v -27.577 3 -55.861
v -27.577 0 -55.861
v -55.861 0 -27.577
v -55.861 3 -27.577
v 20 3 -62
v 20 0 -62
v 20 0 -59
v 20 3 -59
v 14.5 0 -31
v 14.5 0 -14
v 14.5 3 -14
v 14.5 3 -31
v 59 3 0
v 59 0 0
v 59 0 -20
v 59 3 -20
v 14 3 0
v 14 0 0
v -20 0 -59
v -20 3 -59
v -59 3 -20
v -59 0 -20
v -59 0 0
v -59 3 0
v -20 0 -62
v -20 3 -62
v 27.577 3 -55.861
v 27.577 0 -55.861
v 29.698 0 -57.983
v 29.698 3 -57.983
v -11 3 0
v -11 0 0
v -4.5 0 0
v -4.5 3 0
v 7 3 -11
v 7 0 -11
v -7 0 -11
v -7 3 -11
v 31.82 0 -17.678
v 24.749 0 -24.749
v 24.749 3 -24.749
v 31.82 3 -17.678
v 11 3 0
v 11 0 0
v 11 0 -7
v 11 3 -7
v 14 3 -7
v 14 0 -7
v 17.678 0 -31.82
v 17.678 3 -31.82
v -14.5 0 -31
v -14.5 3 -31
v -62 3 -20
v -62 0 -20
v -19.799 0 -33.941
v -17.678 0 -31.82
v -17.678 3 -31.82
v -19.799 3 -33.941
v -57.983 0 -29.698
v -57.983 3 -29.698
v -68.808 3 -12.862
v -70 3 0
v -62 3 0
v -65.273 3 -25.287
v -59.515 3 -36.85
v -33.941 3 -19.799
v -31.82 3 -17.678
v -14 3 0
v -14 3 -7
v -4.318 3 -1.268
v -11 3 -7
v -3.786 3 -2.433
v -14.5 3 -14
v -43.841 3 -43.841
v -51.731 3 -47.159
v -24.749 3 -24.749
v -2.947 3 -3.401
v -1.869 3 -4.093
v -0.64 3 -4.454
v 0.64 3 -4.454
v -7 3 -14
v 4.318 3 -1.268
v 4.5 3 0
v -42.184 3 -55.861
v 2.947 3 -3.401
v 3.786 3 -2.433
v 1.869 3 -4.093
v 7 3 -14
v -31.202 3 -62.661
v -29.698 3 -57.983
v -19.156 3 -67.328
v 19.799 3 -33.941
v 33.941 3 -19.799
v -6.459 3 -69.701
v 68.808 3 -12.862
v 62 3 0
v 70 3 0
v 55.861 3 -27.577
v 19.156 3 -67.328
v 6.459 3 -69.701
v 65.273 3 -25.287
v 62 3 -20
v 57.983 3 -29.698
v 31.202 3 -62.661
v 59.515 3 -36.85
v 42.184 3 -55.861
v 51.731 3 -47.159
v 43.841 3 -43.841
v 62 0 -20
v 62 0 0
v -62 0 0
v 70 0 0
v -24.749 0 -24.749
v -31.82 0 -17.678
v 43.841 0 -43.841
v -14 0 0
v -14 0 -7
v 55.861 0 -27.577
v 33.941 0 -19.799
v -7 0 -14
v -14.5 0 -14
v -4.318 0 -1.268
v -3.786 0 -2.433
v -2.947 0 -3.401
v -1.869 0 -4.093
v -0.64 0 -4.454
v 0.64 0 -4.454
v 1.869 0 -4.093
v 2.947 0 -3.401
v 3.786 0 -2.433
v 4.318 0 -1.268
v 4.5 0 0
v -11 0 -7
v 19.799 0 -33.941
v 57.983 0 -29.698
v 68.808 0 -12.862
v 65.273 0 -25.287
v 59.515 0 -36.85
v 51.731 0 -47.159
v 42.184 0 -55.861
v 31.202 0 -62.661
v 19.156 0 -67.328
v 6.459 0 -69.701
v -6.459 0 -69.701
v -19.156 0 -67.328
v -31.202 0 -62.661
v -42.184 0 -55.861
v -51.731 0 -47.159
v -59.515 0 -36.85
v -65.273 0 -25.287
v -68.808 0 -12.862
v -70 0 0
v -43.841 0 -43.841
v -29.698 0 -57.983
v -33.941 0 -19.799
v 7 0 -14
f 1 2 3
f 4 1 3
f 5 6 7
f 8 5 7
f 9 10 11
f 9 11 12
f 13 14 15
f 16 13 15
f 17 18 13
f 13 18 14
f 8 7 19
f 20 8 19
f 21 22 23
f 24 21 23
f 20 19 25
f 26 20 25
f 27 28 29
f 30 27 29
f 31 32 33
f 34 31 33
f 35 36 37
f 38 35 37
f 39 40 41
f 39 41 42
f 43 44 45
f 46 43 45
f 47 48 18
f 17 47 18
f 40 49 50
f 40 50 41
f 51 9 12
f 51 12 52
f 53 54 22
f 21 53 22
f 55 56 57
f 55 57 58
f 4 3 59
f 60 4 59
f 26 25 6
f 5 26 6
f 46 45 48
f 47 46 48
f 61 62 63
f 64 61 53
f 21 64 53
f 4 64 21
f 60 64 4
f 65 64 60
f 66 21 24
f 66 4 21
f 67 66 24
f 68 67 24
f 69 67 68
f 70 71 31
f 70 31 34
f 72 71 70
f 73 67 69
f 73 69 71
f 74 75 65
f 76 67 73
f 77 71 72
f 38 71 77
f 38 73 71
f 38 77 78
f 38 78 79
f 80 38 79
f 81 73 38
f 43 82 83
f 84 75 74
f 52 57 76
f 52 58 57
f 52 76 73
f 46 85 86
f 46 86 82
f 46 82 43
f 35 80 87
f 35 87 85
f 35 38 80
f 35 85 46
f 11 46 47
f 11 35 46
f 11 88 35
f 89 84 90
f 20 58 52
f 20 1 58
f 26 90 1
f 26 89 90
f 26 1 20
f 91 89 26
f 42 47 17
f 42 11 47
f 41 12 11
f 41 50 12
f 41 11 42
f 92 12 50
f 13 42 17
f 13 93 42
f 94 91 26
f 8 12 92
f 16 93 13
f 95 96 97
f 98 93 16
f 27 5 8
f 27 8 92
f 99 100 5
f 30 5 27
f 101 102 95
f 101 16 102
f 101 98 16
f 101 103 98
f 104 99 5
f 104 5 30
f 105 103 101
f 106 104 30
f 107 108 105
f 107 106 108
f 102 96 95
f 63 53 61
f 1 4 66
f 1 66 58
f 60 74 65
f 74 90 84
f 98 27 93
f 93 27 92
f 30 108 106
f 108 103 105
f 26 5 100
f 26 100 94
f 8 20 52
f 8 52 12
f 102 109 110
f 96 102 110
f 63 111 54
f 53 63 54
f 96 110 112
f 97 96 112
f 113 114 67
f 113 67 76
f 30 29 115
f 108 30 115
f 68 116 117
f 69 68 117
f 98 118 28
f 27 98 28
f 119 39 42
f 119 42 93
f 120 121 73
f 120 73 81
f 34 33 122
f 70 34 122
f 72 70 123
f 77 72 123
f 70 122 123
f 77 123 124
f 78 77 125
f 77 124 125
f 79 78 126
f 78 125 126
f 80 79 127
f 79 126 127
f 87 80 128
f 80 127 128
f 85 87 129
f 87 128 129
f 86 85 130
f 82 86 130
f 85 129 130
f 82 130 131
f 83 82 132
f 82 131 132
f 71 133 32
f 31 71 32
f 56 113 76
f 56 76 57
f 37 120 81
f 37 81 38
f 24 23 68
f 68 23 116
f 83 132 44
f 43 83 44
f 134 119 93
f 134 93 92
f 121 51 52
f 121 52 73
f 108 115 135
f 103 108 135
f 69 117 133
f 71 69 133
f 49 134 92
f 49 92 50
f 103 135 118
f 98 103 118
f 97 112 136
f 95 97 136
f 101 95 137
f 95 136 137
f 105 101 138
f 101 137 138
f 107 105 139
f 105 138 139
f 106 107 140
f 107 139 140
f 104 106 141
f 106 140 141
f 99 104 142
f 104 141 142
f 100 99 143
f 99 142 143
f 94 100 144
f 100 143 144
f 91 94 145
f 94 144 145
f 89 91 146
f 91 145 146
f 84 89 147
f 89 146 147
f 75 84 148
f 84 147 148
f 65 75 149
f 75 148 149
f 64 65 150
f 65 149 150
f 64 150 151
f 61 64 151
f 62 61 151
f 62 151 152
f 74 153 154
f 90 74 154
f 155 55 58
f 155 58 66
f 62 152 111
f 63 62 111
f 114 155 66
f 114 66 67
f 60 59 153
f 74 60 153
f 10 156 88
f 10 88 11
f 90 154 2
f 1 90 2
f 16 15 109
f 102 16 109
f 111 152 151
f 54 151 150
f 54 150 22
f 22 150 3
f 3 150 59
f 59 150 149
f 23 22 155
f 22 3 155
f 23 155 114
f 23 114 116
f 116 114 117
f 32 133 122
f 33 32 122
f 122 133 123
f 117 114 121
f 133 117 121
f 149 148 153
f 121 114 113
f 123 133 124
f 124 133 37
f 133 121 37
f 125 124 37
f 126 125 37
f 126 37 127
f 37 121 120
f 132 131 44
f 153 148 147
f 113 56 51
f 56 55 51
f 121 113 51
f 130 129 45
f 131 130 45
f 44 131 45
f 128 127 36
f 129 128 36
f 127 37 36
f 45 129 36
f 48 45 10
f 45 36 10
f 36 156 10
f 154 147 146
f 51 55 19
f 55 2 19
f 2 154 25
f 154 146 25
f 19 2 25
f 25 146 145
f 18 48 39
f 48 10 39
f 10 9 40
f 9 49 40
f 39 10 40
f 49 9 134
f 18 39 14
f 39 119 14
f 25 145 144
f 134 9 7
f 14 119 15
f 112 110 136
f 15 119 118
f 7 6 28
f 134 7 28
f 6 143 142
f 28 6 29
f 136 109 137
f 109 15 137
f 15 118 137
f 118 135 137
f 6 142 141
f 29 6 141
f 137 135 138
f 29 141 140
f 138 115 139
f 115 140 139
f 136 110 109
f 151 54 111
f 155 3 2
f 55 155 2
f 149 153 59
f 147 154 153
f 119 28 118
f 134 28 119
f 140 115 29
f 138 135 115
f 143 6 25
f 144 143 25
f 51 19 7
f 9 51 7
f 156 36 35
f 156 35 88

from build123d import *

# Parameters (mm, degrees)
SALIENTE_EXTRUIR1_DEPTH = 3


with BuildPart() as part:
    # Croquis1 → Saliente-Extruir1 (new body)
    with BuildSketch(Plane(origin=(0, 0, 0), x_dir=(1, 0, 0), z_dir=(0, 1, 0))):
        with BuildLine():
            Line((11, 0), (11, 7))
            Line((11, 7), (14, 7))
            Line((14, 7), (14, 0))
            Line((14, 0), (17, 0))
            Line((17, 0), (59, 0))
            Line((59, 0), (59, 20))
            Line((59, 20), (62, 20))
            Line((62, 20), (62, 0))
            Line((62, 0), (70, 0))
            ThreePointArc((70, 0), (0, 70), (-70, 0))
            Line((-70, 0), (-62, 0))
            Line((-62, 0), (-62, 20))
            Line((-62, 20), (-59, 20))
            Line((-59, 20), (-59, 0))
            Line((-59, 0), (-17, 0))
            Line((-17, 0), (-14, 0))
            Line((-14, 0), (-14, 7))
            Line((-14, 7), (-11, 7))
            Line((-11, 7), (-11, 0))
            Line((-11, 0), (-4.5, 0))
            ThreePointArc((-4.5, 0), (0, 4.5), (4.5, 0))
            Line((4.5, 0), (11, 0))
        make_face()
        Polygon((0, 11), (7, 11), (7, 14), (14.5, 14), (14.5, 31), (-14.5, 31), (-14.5, 14), (-7, 14), (-7, 11), align=None, mode=Mode.SUBTRACT)
        Polygon((24.748737342, 24.748737342), (31.819805153, 17.67766953), (33.941125497, 19.798989873), (19.798989873, 33.941125497), (17.67766953, 31.819805153), align=None, mode=Mode.SUBTRACT)
        Polygon((-24.748737342, 24.748737342), (-17.67766953, 31.819805153), (-19.798989873, 33.941125497), (-33.941125497, 19.798989873), (-31.819805153, 17.67766953), align=None, mode=Mode.SUBTRACT)
        Polygon((0, 62), (20, 62), (20, 59), (-20, 59), (-20, 62), align=None, mode=Mode.SUBTRACT)
        Polygon((55.861435714, 27.577164466), (27.577164466, 55.861435714), (29.69848481, 57.982756057), (43.840620434, 43.840620434), (57.982756057, 29.69848481), align=None, mode=Mode.SUBTRACT)
        Polygon((-27.577164466, 55.861435714), (-55.861435714, 27.577164466), (-57.982756057, 29.69848481), (-43.840620434, 43.840620434), (-29.69848481, 57.982756057), align=None, mode=Mode.SUBTRACT)
    extrude(amount=SALIENTE_EXTRUIR1_DEPTH)


solid = part.part
